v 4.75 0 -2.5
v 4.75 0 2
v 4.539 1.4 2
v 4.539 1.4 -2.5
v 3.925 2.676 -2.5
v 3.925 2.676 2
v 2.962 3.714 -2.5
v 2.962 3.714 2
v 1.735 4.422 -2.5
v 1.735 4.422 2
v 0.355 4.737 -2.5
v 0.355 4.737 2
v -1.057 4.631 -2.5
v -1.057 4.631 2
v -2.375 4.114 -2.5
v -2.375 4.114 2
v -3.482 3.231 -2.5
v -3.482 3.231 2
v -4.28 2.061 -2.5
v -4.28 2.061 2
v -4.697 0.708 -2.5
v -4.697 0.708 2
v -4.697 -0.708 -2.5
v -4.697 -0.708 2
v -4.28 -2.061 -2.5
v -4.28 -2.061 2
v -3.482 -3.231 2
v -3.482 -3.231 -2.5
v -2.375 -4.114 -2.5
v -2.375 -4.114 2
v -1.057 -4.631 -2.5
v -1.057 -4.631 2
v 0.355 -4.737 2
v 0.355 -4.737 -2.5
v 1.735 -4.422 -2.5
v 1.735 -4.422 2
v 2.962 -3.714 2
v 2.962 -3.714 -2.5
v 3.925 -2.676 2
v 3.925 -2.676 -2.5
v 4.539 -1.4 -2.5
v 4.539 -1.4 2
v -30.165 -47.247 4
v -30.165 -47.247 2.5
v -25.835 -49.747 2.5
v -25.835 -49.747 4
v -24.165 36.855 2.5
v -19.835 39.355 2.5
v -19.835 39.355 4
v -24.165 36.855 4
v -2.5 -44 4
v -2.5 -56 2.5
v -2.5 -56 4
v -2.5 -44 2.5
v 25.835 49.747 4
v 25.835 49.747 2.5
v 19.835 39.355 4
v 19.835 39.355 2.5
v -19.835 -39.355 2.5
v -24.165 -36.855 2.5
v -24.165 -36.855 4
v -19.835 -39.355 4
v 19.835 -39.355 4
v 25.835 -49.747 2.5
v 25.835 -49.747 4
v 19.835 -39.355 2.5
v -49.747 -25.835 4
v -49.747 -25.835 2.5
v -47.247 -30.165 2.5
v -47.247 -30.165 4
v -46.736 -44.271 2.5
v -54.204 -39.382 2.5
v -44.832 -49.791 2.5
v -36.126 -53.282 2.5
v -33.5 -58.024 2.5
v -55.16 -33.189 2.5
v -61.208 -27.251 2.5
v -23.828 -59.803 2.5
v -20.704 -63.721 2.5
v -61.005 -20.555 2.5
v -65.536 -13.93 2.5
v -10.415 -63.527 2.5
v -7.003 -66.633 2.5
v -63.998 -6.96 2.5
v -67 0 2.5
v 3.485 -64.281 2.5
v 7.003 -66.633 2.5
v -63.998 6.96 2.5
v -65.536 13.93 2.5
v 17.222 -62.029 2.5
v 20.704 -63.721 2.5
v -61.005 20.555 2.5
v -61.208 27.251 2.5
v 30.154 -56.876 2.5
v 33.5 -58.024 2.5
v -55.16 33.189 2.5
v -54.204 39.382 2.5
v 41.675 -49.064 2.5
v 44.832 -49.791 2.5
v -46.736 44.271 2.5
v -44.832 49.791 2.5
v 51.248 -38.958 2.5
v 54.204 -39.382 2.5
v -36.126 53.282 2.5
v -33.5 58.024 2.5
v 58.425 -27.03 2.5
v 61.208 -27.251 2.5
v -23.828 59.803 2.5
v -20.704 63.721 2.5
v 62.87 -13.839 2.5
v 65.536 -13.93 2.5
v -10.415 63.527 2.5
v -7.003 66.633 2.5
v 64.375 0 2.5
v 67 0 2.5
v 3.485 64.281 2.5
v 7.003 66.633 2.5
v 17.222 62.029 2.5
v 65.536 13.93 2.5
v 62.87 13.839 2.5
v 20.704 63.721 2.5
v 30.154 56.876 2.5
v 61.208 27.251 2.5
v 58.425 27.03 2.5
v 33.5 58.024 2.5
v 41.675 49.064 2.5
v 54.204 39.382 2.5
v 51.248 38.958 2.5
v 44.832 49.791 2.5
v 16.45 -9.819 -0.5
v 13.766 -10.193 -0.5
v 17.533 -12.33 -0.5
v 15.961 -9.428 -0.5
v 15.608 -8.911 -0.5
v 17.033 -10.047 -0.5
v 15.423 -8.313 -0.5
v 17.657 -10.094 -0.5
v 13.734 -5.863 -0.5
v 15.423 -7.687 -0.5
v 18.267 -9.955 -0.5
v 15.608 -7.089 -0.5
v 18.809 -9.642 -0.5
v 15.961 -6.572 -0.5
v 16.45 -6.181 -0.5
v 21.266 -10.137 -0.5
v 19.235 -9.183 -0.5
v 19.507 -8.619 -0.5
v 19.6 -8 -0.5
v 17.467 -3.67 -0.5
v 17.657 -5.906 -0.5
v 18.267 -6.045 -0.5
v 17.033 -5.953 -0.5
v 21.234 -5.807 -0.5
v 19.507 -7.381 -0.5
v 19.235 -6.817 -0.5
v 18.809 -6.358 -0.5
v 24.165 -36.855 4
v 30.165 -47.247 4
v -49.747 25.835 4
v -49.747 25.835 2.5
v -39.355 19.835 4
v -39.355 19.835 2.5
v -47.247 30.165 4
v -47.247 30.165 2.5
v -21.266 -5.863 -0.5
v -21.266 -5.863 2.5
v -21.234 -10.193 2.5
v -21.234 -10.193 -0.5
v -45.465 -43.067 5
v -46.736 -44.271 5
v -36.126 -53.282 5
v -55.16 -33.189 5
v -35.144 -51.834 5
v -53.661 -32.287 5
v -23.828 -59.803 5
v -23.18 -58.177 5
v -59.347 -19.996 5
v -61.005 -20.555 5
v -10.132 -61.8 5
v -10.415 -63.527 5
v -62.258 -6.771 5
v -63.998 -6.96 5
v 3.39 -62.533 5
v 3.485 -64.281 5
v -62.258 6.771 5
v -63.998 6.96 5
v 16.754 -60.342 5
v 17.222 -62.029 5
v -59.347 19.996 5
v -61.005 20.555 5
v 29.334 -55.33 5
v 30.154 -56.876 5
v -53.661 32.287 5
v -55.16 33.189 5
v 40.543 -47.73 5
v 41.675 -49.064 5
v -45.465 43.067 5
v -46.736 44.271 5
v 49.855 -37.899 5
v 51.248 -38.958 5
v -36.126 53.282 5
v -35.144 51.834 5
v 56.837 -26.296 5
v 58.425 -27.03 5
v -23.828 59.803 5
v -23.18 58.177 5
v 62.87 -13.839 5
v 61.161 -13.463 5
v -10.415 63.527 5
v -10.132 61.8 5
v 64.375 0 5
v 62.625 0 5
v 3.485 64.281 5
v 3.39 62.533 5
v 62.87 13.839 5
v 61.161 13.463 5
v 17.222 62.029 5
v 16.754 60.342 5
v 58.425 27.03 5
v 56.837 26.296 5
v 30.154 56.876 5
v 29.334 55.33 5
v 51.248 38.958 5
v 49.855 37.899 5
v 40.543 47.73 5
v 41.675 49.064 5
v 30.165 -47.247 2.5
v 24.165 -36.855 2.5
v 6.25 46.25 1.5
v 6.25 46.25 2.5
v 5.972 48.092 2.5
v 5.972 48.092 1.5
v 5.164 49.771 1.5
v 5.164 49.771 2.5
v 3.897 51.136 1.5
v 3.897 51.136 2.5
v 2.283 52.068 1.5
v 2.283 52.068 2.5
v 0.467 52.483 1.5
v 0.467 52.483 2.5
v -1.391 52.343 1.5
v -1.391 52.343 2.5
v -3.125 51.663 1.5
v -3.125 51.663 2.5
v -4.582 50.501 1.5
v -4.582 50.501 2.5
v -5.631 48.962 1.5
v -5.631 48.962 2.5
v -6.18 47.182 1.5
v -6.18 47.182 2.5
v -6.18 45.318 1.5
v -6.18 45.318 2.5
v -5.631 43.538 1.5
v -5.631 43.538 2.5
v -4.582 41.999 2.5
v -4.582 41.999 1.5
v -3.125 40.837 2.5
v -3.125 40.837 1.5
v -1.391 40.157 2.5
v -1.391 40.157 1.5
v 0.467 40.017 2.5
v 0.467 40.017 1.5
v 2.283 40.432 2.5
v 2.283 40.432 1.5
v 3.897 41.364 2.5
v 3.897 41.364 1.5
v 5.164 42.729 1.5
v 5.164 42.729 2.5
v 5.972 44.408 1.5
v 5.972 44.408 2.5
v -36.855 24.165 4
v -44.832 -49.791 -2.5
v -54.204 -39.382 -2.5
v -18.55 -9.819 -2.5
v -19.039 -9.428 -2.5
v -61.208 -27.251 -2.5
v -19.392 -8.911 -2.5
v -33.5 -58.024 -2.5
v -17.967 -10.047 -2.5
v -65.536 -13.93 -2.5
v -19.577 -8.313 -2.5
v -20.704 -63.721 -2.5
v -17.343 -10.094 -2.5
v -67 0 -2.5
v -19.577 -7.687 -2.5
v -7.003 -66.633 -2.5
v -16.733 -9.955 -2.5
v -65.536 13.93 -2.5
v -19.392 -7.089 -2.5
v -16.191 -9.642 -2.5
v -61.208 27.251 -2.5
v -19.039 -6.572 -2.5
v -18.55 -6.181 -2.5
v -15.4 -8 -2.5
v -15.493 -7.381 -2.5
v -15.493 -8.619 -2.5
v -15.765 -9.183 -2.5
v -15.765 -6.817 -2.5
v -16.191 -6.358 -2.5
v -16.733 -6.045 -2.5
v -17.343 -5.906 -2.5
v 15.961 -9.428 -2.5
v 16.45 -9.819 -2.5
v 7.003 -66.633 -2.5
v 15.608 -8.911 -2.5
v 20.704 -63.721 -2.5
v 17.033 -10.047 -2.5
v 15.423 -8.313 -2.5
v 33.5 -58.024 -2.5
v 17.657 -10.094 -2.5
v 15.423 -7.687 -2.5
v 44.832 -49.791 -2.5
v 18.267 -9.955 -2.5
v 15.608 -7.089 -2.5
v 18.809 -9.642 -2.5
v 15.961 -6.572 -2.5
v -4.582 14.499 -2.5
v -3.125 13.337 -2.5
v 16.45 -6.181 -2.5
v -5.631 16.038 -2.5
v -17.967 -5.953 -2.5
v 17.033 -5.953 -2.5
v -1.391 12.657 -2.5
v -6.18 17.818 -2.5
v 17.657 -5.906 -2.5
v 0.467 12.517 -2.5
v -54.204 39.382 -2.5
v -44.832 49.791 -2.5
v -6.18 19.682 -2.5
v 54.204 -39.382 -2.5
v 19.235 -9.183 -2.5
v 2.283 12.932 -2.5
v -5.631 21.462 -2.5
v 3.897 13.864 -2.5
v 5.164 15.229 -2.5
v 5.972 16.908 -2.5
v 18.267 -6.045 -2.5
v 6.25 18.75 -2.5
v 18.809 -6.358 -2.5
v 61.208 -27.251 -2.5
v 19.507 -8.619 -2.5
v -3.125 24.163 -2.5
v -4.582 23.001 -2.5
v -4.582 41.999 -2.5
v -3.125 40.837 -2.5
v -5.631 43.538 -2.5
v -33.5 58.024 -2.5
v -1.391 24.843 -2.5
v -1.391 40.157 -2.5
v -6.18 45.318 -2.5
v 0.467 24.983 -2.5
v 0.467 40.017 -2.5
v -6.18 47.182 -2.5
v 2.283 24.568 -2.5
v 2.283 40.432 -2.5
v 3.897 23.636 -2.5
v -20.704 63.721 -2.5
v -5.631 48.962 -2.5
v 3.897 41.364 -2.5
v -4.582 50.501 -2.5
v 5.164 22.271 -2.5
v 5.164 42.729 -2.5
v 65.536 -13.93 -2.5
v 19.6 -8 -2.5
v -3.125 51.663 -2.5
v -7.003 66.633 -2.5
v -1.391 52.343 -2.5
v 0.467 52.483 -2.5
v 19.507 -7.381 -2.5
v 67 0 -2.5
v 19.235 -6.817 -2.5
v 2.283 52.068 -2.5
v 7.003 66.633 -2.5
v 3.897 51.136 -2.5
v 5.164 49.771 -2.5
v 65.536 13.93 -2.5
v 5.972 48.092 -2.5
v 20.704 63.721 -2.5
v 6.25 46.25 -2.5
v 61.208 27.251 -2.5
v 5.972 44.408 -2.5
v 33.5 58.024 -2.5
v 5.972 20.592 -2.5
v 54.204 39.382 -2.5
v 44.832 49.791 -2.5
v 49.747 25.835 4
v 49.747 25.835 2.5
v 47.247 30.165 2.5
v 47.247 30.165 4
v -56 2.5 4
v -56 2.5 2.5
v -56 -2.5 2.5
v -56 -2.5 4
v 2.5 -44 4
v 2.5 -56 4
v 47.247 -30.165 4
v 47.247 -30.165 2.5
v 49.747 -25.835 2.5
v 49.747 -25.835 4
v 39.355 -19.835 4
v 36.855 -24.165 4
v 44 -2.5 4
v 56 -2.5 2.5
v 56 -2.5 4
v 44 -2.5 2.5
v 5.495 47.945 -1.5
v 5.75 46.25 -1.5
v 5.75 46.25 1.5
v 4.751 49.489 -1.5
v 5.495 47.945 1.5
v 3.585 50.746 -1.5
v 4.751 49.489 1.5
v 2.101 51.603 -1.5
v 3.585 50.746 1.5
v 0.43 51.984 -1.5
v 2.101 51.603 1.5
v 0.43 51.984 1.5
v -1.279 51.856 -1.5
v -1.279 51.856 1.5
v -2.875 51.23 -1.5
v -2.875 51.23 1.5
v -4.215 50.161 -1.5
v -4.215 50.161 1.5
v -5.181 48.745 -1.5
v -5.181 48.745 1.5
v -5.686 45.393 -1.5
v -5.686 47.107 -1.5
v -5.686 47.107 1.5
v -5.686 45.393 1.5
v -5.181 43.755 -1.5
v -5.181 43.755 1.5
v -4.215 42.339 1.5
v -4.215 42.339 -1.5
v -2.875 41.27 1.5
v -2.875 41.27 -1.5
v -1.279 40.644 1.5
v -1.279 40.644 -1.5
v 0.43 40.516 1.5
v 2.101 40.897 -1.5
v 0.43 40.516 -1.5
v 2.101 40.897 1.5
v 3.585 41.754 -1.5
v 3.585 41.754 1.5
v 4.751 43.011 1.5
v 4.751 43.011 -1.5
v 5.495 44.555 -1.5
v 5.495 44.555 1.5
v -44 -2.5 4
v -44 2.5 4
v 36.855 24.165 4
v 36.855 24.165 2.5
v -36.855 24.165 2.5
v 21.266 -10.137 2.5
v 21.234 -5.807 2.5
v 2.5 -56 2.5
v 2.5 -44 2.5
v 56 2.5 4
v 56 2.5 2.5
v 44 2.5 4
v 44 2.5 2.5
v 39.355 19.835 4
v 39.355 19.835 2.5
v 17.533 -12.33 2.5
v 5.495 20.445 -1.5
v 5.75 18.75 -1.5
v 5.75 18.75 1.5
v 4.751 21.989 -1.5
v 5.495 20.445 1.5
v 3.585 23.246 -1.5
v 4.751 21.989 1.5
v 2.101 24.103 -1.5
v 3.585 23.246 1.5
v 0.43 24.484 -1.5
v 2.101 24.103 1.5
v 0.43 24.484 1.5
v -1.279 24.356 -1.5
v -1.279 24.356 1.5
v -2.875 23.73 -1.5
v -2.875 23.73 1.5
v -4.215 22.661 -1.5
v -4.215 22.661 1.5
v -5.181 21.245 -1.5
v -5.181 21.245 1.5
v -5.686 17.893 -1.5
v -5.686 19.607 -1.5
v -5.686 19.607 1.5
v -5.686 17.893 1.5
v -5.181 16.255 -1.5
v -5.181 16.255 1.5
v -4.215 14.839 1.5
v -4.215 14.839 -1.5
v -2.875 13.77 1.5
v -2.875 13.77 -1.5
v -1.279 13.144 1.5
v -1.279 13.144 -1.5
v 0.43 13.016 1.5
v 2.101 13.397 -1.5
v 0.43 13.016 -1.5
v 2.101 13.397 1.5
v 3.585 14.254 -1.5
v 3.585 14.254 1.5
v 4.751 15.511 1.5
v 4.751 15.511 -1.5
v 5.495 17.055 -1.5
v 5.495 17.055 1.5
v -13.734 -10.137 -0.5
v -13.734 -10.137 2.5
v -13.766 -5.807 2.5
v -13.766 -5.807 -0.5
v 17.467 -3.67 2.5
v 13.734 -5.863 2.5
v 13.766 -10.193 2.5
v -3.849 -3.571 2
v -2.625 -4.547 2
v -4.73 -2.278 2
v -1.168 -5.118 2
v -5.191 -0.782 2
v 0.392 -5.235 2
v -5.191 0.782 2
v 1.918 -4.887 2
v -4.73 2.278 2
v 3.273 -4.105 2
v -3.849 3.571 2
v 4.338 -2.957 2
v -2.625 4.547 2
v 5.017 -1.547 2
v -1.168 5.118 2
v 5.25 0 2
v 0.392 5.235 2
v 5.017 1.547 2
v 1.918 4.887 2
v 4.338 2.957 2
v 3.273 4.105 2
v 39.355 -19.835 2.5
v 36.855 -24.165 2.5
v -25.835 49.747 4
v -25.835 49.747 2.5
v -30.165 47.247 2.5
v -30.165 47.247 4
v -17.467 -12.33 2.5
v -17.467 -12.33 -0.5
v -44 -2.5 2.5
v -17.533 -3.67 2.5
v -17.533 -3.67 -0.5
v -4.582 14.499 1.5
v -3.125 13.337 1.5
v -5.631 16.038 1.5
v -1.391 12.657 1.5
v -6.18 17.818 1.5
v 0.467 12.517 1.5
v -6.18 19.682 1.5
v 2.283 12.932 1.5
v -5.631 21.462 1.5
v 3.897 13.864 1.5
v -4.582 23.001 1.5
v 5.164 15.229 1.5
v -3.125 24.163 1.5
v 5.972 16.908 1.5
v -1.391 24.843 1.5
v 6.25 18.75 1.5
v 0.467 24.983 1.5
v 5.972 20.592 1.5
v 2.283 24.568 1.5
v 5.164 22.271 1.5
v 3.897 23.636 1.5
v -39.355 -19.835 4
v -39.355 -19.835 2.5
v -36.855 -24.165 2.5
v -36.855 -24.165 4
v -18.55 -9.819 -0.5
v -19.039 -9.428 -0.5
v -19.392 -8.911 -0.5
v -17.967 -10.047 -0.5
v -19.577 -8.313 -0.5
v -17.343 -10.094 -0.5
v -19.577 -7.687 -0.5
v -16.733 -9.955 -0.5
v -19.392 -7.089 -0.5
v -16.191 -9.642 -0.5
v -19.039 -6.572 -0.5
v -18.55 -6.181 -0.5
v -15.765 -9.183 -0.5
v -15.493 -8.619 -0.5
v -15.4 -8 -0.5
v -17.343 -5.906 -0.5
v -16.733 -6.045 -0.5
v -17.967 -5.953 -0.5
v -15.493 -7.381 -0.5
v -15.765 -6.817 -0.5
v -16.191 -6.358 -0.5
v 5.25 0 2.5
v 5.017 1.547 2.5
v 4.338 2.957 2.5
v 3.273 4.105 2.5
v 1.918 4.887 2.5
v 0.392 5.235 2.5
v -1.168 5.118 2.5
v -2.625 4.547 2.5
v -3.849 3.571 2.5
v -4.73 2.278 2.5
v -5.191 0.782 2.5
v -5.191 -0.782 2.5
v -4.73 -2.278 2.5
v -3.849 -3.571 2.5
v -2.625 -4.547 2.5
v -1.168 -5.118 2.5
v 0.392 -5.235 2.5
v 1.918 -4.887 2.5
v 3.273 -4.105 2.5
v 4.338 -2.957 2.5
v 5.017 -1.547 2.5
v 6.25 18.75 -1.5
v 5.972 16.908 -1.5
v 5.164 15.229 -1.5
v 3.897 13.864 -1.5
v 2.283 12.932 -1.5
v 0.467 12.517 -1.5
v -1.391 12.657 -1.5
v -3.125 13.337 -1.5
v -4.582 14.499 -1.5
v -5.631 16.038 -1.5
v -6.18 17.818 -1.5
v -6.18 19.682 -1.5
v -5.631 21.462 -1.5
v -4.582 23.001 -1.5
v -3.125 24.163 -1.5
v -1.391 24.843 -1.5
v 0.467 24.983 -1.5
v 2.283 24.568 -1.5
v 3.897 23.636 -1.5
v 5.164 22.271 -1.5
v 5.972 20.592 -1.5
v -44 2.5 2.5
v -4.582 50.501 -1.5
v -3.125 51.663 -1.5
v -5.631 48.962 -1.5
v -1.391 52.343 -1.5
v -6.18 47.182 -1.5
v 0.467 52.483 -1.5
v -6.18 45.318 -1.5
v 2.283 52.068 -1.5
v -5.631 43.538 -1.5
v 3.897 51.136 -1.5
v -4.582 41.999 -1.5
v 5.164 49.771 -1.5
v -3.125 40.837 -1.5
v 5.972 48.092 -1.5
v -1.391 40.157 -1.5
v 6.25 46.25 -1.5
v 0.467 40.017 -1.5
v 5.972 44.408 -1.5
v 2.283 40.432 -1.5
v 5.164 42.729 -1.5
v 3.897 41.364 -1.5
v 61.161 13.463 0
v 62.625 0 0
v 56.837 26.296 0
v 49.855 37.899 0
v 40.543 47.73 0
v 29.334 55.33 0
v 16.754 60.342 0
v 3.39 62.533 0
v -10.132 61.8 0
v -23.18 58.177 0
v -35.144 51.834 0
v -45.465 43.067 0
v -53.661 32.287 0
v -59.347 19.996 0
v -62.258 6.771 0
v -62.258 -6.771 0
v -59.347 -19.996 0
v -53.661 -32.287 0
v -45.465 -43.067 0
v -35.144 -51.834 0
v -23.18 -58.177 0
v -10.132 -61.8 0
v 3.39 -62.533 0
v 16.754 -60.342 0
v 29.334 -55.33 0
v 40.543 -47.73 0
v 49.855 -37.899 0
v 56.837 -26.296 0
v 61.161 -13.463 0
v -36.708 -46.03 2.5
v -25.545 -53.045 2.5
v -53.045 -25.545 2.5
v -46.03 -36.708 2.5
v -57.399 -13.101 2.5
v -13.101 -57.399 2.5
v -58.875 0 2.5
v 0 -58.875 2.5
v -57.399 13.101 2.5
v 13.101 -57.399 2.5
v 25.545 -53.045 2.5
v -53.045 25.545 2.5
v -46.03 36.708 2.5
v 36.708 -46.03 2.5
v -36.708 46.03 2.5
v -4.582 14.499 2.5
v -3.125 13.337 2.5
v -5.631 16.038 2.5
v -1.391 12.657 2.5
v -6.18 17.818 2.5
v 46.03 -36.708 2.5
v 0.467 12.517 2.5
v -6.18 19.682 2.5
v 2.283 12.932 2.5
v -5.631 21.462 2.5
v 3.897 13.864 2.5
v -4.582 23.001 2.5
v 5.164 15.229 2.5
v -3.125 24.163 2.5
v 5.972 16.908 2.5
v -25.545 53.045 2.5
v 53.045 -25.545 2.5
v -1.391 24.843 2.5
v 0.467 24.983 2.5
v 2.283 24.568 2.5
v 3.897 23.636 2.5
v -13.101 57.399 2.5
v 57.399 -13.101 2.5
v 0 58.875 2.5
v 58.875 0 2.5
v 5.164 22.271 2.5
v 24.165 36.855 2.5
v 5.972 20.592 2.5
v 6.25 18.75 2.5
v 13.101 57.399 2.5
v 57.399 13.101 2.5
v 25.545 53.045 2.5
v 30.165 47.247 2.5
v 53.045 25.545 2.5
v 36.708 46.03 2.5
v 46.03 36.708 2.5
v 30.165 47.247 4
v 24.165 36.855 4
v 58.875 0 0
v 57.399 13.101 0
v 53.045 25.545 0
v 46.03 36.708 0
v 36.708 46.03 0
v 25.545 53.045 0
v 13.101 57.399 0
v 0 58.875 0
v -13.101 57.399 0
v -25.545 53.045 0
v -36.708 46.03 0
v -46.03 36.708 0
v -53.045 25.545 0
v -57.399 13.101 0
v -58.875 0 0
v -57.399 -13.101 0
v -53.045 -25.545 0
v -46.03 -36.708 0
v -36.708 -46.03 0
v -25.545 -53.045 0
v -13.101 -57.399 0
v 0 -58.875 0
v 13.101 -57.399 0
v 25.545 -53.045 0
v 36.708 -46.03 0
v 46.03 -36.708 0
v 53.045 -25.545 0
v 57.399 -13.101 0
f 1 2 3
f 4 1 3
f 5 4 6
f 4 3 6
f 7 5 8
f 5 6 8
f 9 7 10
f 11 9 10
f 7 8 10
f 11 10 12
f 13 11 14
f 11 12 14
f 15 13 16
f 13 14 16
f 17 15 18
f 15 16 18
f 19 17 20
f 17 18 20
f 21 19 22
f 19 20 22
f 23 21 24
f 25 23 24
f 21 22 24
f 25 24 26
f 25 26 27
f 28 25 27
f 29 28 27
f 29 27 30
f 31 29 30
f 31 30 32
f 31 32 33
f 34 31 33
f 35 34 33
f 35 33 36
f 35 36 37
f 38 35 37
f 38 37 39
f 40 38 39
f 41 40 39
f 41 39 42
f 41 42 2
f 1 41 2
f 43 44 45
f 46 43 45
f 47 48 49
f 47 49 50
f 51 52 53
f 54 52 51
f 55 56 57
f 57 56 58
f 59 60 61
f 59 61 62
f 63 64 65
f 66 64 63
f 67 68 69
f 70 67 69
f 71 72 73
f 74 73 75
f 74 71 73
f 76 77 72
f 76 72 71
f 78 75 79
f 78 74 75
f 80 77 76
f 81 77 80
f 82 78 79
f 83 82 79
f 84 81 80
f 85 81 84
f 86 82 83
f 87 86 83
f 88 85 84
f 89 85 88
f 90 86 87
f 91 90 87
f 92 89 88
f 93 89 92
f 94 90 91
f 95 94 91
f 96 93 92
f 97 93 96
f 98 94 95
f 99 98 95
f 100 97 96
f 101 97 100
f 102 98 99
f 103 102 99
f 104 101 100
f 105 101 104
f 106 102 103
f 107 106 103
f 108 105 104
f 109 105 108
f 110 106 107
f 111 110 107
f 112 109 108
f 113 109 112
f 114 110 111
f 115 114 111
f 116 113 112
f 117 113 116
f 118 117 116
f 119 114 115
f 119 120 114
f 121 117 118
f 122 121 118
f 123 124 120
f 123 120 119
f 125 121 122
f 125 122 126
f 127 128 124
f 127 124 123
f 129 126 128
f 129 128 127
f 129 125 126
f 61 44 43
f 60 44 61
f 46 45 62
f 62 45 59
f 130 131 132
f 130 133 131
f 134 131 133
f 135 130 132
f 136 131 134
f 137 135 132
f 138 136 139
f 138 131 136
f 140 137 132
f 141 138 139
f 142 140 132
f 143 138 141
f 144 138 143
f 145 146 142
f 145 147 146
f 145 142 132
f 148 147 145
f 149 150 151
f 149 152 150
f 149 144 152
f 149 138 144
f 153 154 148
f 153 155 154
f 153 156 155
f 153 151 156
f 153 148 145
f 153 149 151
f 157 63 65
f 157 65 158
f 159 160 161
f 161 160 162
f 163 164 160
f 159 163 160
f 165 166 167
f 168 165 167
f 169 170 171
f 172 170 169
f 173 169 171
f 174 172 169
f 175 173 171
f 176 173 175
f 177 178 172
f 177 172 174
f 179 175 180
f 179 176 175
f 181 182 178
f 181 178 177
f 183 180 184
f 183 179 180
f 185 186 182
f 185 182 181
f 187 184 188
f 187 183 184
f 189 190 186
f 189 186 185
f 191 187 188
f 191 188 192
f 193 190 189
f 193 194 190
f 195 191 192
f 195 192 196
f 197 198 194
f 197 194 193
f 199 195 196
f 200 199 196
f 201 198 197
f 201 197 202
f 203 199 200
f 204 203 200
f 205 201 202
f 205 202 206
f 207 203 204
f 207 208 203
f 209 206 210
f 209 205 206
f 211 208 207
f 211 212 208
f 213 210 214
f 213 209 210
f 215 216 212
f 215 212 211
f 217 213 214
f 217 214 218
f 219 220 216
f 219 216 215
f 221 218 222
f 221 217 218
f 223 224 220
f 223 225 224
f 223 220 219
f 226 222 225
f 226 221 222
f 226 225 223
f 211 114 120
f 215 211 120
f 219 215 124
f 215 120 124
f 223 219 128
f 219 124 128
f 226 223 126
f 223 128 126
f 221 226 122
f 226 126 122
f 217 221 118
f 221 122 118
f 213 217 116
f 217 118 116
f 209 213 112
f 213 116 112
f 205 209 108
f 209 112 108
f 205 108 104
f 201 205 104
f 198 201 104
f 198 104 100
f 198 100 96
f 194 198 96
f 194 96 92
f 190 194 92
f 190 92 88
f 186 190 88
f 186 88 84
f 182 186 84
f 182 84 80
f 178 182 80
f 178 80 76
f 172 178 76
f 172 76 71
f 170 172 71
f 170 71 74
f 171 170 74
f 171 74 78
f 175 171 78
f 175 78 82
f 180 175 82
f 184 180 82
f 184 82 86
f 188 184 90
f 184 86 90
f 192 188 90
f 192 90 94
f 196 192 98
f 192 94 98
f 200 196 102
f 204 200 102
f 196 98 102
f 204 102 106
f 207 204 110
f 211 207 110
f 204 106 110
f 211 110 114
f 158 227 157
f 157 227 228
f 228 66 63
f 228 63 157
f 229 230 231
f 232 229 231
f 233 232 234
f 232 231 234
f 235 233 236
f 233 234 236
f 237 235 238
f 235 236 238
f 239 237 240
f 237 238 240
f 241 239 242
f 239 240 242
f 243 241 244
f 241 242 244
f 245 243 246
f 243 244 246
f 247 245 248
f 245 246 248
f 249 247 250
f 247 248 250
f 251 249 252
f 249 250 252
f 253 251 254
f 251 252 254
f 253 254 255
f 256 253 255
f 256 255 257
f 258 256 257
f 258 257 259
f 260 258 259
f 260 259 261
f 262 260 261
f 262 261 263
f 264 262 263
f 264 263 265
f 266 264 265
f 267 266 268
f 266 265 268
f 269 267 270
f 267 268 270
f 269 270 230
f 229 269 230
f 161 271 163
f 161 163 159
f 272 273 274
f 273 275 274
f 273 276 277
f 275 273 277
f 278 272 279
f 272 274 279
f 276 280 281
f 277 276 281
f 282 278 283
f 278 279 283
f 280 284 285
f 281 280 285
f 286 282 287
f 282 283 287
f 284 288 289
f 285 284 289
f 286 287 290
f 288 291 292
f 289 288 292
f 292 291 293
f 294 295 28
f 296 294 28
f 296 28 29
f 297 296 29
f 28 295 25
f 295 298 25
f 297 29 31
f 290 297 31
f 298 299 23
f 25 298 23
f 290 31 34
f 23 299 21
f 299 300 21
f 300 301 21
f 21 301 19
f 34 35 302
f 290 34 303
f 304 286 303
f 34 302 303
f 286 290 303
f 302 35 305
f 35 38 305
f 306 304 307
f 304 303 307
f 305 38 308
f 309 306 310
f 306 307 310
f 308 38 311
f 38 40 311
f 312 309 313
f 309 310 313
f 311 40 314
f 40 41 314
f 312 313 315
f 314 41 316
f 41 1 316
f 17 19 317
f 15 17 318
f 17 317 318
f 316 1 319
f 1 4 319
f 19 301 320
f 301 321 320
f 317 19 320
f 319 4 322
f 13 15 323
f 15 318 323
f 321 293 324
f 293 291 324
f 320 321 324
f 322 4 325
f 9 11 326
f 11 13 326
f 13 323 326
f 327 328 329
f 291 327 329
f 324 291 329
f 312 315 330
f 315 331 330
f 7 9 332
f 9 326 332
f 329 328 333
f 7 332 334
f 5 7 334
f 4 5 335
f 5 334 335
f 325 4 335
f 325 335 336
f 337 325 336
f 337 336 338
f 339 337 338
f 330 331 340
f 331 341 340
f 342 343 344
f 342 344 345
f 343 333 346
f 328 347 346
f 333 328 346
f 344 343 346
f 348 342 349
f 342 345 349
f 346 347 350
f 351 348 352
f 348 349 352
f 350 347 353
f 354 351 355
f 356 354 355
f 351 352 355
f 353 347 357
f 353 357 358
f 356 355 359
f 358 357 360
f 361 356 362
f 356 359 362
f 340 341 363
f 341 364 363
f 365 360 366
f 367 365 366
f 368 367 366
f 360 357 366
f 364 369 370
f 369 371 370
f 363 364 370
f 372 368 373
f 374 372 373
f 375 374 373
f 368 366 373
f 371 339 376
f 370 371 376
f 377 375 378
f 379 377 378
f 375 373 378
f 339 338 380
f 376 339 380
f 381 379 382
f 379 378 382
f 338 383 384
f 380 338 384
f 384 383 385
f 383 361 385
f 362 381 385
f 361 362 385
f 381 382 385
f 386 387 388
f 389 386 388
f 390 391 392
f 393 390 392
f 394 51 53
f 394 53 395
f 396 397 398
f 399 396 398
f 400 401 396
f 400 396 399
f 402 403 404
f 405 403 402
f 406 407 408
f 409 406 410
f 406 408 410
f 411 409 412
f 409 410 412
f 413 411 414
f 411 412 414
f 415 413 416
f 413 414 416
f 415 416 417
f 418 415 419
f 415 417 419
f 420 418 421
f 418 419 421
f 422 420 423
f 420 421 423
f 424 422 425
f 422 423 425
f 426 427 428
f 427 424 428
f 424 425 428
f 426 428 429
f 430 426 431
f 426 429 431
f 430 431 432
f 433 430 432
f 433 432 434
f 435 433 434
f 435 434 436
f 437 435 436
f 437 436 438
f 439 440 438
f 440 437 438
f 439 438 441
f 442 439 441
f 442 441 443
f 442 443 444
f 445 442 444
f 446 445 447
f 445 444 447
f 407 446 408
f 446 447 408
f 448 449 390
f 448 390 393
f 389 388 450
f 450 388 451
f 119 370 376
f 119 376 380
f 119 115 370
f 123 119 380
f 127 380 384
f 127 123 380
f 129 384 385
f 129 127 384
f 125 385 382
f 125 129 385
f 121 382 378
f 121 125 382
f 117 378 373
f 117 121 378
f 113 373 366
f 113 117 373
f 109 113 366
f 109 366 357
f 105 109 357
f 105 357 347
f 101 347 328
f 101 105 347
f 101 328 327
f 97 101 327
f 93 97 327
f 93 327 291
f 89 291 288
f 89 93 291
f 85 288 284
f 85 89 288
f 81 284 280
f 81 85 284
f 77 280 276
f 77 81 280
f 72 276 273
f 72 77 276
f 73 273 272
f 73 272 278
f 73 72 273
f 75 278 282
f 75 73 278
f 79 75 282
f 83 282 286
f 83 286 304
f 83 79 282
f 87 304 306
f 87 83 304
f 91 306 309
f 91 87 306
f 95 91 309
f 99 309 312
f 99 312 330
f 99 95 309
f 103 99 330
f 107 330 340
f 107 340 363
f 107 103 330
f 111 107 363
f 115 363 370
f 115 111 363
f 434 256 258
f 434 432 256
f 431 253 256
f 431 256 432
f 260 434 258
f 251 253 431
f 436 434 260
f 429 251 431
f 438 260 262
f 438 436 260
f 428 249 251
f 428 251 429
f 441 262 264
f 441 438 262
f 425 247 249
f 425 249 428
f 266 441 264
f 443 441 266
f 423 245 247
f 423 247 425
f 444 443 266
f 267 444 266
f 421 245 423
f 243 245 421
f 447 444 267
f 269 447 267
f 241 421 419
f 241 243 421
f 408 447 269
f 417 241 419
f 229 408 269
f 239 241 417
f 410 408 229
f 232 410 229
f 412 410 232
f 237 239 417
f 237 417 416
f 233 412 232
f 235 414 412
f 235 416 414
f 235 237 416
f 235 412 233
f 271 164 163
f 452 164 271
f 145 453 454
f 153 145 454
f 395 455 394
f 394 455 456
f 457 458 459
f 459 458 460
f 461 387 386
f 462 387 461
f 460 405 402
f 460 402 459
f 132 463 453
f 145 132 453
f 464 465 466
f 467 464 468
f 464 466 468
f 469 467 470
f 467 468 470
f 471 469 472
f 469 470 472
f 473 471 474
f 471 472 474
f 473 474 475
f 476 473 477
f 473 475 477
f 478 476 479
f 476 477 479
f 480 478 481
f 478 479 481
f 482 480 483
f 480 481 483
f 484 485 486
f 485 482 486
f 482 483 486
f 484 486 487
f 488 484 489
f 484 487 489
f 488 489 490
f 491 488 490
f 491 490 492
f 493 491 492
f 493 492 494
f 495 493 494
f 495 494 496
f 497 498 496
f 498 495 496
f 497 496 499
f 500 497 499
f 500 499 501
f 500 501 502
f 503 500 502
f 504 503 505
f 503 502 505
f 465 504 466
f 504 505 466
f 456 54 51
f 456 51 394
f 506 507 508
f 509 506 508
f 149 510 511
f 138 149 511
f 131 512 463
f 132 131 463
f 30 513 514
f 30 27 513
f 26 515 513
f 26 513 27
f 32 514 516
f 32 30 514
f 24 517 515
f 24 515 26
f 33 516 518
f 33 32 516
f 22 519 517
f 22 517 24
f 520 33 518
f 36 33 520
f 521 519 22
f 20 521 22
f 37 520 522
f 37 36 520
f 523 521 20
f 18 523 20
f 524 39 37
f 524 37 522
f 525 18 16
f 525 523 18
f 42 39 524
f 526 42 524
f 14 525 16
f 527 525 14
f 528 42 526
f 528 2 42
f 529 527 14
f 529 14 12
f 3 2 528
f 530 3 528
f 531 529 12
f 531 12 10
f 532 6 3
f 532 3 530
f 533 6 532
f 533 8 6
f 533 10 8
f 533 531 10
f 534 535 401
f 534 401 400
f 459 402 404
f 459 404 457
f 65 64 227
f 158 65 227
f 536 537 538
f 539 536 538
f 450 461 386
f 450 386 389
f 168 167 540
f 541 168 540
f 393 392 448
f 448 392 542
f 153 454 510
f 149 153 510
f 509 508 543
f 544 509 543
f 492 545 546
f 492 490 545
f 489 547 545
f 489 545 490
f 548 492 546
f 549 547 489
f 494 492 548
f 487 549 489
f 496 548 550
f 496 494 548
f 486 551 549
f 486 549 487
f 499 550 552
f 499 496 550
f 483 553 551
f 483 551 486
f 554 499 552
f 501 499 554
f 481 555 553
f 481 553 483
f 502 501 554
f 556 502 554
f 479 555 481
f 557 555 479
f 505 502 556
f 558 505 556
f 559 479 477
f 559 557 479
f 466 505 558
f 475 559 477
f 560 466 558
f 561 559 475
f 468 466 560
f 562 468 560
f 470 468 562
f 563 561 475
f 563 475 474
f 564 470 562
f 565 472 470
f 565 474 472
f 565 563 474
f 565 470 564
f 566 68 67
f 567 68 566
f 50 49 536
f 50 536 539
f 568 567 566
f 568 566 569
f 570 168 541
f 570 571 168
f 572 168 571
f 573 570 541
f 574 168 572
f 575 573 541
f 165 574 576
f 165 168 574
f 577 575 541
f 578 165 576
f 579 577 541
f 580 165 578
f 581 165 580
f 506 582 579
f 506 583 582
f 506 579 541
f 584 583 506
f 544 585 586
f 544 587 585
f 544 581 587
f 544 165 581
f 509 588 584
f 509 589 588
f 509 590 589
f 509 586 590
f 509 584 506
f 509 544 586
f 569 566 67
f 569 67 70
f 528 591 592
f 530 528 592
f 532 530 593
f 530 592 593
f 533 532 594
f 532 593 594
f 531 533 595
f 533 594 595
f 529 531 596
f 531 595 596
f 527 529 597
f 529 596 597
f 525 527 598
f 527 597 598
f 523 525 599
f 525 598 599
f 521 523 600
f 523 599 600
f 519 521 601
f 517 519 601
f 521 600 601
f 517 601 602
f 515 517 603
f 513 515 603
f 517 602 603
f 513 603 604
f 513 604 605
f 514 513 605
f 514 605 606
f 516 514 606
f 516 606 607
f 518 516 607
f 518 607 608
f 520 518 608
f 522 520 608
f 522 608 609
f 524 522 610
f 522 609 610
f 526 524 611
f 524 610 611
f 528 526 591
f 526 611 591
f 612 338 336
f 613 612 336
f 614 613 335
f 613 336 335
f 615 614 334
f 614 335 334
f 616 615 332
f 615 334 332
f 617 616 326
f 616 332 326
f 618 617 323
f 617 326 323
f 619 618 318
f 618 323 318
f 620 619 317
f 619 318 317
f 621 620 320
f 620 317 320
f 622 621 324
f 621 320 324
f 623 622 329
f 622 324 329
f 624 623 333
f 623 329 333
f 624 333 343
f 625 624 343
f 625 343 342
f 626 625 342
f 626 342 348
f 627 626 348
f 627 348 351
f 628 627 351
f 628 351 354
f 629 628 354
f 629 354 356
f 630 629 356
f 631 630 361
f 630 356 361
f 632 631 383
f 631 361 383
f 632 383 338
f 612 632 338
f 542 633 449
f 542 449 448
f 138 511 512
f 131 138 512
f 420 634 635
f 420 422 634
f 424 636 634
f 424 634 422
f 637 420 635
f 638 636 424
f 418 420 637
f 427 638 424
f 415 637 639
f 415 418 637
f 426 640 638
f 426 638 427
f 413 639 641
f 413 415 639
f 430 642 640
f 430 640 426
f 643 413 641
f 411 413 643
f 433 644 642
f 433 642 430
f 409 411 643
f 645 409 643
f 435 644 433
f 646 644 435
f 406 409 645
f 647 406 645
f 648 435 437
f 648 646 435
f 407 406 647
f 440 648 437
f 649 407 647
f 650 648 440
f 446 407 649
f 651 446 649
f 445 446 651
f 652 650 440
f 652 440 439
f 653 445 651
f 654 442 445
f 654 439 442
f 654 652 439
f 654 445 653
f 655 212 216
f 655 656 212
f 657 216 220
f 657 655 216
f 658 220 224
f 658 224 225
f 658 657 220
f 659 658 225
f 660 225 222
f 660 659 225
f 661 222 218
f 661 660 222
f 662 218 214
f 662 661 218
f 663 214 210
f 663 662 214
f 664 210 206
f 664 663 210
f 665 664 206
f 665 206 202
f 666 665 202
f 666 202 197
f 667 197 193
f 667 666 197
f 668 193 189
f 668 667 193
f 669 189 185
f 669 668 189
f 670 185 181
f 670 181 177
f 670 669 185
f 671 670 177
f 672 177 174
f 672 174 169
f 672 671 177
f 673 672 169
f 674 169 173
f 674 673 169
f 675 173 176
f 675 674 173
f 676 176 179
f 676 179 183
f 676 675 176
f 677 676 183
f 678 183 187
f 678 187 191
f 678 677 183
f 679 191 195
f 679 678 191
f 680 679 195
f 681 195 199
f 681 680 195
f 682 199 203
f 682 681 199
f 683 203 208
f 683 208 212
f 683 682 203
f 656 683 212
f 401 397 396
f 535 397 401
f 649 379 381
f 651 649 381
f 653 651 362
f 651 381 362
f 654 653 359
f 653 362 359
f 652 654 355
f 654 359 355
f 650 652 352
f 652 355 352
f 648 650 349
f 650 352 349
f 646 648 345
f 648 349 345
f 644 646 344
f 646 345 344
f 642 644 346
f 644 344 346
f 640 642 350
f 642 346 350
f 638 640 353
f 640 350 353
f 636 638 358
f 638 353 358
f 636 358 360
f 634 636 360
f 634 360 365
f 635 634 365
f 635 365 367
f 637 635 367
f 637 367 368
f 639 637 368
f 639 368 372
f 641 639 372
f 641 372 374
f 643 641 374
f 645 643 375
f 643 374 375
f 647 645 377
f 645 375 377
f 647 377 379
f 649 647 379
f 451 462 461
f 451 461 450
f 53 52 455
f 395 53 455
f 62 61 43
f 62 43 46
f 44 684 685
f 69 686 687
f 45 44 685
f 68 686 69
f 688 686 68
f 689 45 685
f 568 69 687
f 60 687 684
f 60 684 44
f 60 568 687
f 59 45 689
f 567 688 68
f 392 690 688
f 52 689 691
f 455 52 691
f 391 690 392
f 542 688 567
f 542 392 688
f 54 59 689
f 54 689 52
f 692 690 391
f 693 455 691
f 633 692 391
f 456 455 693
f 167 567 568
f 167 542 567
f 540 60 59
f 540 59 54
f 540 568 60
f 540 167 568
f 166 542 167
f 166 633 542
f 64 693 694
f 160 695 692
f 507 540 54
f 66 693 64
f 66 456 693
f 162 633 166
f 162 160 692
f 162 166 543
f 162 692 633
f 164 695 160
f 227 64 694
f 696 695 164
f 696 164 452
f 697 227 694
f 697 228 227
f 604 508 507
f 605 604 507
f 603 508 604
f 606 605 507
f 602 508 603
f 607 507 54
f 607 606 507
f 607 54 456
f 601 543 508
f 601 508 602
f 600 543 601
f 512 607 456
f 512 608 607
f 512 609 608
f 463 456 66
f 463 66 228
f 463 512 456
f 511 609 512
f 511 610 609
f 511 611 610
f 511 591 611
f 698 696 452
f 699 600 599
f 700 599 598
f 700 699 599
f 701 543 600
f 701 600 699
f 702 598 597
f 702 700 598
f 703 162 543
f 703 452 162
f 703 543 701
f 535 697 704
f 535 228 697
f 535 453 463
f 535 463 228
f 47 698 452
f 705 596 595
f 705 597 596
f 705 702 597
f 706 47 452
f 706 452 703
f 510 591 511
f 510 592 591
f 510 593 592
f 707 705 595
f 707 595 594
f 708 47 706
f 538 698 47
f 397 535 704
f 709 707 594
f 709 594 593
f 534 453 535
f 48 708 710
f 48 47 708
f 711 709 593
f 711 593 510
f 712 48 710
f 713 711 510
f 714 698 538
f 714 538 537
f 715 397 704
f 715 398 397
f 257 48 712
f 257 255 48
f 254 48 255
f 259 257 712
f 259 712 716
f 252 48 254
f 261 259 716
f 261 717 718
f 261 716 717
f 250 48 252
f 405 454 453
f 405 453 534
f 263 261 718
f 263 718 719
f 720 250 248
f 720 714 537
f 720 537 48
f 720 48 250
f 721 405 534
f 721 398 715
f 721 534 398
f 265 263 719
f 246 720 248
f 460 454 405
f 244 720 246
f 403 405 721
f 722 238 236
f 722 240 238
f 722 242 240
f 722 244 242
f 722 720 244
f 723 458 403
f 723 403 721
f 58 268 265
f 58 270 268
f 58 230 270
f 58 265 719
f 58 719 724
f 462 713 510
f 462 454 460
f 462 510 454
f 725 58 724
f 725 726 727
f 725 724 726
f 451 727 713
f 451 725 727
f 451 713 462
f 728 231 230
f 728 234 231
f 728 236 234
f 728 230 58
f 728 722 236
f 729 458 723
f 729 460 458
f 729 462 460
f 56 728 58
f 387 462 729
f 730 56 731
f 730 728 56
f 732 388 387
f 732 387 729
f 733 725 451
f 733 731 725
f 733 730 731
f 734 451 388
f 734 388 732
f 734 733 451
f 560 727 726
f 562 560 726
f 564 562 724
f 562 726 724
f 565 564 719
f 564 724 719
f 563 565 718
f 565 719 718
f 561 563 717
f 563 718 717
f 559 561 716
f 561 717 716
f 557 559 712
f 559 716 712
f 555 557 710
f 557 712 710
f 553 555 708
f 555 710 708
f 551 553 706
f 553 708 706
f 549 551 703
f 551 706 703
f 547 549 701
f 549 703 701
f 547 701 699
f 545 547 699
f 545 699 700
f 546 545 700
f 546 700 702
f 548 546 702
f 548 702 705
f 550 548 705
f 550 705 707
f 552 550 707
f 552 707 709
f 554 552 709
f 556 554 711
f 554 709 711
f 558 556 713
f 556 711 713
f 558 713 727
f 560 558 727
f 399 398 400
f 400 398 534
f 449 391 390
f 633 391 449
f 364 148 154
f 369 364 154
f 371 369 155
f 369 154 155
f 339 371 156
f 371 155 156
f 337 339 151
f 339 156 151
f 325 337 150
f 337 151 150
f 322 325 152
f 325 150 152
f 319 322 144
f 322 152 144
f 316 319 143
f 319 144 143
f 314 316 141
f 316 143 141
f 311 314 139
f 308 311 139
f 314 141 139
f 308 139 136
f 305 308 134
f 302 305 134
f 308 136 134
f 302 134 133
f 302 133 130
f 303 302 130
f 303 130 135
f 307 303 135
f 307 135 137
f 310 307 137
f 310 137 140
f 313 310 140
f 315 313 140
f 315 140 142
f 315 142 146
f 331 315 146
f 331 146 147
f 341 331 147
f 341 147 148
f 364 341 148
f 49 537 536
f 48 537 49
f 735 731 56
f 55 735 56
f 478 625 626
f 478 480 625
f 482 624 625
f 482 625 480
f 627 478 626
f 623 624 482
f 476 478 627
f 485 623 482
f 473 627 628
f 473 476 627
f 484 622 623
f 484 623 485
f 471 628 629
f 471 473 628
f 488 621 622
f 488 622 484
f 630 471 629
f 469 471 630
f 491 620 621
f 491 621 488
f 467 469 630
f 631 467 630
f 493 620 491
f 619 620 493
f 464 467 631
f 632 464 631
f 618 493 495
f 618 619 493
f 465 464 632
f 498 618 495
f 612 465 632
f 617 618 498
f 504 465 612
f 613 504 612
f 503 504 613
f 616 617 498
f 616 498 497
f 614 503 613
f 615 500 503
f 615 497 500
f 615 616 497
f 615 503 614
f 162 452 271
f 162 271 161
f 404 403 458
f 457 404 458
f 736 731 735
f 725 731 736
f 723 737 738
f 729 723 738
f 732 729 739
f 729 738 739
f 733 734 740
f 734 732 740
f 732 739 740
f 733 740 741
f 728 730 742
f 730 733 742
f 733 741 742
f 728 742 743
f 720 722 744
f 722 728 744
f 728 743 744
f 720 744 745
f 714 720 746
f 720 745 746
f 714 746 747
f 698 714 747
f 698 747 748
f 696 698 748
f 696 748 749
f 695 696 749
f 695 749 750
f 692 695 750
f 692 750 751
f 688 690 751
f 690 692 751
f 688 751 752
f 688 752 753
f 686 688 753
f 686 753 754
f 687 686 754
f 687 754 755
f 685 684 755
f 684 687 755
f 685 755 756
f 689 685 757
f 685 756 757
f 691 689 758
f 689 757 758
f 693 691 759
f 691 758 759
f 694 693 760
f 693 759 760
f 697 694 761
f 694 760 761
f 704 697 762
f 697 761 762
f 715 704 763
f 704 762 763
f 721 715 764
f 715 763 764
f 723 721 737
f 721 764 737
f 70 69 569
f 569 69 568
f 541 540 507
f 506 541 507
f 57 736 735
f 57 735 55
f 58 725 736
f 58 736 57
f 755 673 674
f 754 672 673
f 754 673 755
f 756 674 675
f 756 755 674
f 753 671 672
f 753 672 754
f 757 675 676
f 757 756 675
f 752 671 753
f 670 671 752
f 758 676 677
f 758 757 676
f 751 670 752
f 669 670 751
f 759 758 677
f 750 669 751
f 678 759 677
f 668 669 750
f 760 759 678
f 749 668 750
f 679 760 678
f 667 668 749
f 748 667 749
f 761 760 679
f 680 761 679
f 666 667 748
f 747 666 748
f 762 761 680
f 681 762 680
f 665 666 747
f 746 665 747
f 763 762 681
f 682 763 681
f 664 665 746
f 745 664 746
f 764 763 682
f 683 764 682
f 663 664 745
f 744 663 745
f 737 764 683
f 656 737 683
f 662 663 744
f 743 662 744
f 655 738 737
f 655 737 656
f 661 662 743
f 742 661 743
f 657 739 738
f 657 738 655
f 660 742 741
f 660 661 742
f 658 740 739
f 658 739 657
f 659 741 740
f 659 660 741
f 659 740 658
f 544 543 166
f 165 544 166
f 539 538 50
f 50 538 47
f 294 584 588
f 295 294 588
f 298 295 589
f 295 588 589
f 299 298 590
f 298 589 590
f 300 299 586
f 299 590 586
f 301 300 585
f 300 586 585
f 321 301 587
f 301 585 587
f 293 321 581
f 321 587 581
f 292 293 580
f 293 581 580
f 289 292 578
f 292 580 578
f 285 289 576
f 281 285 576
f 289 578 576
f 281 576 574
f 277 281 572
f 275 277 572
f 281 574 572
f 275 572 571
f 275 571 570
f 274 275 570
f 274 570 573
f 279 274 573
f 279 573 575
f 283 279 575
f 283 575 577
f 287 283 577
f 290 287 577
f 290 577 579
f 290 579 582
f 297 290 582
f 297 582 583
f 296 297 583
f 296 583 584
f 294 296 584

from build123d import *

# Parameters (mm, degrees)
F0_R      = 67
F1_DEPTH  = 2.5
F2_R      = 64.375
F2_R_2    = 62.625
F3_DEPTH  = 5
F4_R      = 62.625
F4_R_2    = 58.875
F5_DEPTH  = 5
F6_R      = 4.75
F6_R_2    = 5.75
F6_R_3    = 2.1
F7_DEPTH  = 5.001
F8_R      = 5.25
F8_R_2    = 4.75
F9_DEPTH  = 0.5
F8_R_3    = 6.25
F8_R_4    = 5.75
F10_DEPTH = 1
F8_R_5    = 2.1
F11_DEPTH = 3
F12_R     = 6.25
F12_R_2   = 5.75
F13_DEPTH = 1
F14_W     = 5
F14_H     = 12
F15_DEPTH = 1.5
F16_COUNT = 6
F16_ANGLE = 150
F17_COUNT = 6
F17_ANGLE = 150


with BuildPart() as f1:
    # F0 (on Top) → F1 (new body, symmetric)
    with BuildSketch(Plane.XY):
        Circle(F0_R)
    extrude(amount=F1_DEPTH, both=True)

    # F2 (on Top) → F3 (join)
    with BuildSketch(Plane.XY):
        Circle(F2_R)
        Circle(F2_R_2, mode=Mode.SUBTRACT)
    extrude(amount=F3_DEPTH)

    # F4 (on Top) → F5 (cut)
    with BuildSketch(Plane.XY):
        Circle(F4_R)
        Circle(F4_R_2, mode=Mode.SUBTRACT)
    extrude(amount=F5_DEPTH, mode=Mode.SUBTRACT)

    # F6 (on face) → F7 (cut, through all)
    with BuildSketch(Plane.XY.offset(2.5)):
        Circle(F6_R)
        with Locations((0, 18.75)):
            Circle(F6_R_2)
        with Locations((0, 46.25)):
            Circle(F6_R_2)
        with Locations((17.5, -8)):
            Circle(F6_R_3)
        with Locations((-17.5, -8)):
            Circle(F6_R_3)
    extrude(amount=-F7_DEPTH, mode=Mode.SUBTRACT)

    # F8 (on face) → F9 (cut)
    with BuildSketch(Plane.XY.offset(2.5)):
        Circle(F8_R)
        Circle(F8_R_2, mode=Mode.SUBTRACT)
    extrude(amount=-F9_DEPTH, mode=Mode.SUBTRACT)

    # F8 (on face) → F10 (cut)
    with BuildSketch(Plane.XY.offset(2.5)):
        with Locations((0, 18.75)):
            Circle(F8_R_3)
        with Locations((0, 18.75)):
            Circle(F8_R_4, mode=Mode.SUBTRACT)
        with Locations((0, 46.25)):
            Circle(F8_R_3)
        with Locations((0, 46.25)):
            Circle(F8_R_4, mode=Mode.SUBTRACT)
    extrude(amount=-F10_DEPTH, mode=Mode.SUBTRACT)

    # F8 (on face) → F11 (cut)
    with BuildSketch(Plane.XY.offset(2.5)):
        Polygon((17.5327657222, -12.3300030494), (21.2662755003, -10.1366255769), (21.2335097781, -5.8066225275), (17.4672342778, -3.6699969506), (13.7337244997, -5.8633744231), (13.7664902219, -10.1933774725), align=None)
        with Locations((17.5, -8)):
            Circle(F8_R_5, mode=Mode.SUBTRACT)
        Polygon((-17.4672342778, -12.3300030494), (-13.7337244997, -10.1366255769), (-13.7664902219, -5.8066225275), (-17.5327657222, -3.6699969506), (-21.2662755003, -5.8633744231), (-21.2335097781, -10.1933774725), align=None)
        with Locations((-17.5, -8)):
            Circle(F8_R_5, mode=Mode.SUBTRACT)
    extrude(amount=-F11_DEPTH, mode=Mode.SUBTRACT)

    # F12 (on face) → F13 (cut)
    with BuildSketch(Plane(origin=(0, 0, -2.5), x_dir=(1, 0, 0), z_dir=(0, 0, -1))):
        with Locations((0, -46.25)):
            Circle(F12_R)
        with Locations((0, -46.25)):
            Circle(F12_R_2, mode=Mode.SUBTRACT)
        with Locations((0, -18.75)):
            Circle(F12_R)
        with Locations((0, -18.75)):
            Circle(F12_R_2, mode=Mode.SUBTRACT)
    extrude(amount=-F13_DEPTH, mode=Mode.SUBTRACT)

    # F14 (on face) → F15 (join)
    with BuildSketch(Plane.XY.offset(2.5)):
        with Locations((0, -50)):
            Rectangle(F14_W, F14_H)
    f15 = extrude(amount=F15_DEPTH)

    # F16: F15 ×6 about axis
    f16_axis = Axis((0, 0, 2.5), (0, 0, -1))
    for i in range(1, F16_COUNT):
        add(f15.rotate(f16_axis, i * F16_ANGLE / (F16_COUNT - 1)))

    # F17: F15 ×6 about axis
    f17_axis = Axis((0, 0, 2.5), (0, 0, 1))
    for i in range(1, F17_COUNT):
        add(f15.rotate(f17_axis, i * F17_ANGLE / (F17_COUNT - 1)))


solid = f1.part
